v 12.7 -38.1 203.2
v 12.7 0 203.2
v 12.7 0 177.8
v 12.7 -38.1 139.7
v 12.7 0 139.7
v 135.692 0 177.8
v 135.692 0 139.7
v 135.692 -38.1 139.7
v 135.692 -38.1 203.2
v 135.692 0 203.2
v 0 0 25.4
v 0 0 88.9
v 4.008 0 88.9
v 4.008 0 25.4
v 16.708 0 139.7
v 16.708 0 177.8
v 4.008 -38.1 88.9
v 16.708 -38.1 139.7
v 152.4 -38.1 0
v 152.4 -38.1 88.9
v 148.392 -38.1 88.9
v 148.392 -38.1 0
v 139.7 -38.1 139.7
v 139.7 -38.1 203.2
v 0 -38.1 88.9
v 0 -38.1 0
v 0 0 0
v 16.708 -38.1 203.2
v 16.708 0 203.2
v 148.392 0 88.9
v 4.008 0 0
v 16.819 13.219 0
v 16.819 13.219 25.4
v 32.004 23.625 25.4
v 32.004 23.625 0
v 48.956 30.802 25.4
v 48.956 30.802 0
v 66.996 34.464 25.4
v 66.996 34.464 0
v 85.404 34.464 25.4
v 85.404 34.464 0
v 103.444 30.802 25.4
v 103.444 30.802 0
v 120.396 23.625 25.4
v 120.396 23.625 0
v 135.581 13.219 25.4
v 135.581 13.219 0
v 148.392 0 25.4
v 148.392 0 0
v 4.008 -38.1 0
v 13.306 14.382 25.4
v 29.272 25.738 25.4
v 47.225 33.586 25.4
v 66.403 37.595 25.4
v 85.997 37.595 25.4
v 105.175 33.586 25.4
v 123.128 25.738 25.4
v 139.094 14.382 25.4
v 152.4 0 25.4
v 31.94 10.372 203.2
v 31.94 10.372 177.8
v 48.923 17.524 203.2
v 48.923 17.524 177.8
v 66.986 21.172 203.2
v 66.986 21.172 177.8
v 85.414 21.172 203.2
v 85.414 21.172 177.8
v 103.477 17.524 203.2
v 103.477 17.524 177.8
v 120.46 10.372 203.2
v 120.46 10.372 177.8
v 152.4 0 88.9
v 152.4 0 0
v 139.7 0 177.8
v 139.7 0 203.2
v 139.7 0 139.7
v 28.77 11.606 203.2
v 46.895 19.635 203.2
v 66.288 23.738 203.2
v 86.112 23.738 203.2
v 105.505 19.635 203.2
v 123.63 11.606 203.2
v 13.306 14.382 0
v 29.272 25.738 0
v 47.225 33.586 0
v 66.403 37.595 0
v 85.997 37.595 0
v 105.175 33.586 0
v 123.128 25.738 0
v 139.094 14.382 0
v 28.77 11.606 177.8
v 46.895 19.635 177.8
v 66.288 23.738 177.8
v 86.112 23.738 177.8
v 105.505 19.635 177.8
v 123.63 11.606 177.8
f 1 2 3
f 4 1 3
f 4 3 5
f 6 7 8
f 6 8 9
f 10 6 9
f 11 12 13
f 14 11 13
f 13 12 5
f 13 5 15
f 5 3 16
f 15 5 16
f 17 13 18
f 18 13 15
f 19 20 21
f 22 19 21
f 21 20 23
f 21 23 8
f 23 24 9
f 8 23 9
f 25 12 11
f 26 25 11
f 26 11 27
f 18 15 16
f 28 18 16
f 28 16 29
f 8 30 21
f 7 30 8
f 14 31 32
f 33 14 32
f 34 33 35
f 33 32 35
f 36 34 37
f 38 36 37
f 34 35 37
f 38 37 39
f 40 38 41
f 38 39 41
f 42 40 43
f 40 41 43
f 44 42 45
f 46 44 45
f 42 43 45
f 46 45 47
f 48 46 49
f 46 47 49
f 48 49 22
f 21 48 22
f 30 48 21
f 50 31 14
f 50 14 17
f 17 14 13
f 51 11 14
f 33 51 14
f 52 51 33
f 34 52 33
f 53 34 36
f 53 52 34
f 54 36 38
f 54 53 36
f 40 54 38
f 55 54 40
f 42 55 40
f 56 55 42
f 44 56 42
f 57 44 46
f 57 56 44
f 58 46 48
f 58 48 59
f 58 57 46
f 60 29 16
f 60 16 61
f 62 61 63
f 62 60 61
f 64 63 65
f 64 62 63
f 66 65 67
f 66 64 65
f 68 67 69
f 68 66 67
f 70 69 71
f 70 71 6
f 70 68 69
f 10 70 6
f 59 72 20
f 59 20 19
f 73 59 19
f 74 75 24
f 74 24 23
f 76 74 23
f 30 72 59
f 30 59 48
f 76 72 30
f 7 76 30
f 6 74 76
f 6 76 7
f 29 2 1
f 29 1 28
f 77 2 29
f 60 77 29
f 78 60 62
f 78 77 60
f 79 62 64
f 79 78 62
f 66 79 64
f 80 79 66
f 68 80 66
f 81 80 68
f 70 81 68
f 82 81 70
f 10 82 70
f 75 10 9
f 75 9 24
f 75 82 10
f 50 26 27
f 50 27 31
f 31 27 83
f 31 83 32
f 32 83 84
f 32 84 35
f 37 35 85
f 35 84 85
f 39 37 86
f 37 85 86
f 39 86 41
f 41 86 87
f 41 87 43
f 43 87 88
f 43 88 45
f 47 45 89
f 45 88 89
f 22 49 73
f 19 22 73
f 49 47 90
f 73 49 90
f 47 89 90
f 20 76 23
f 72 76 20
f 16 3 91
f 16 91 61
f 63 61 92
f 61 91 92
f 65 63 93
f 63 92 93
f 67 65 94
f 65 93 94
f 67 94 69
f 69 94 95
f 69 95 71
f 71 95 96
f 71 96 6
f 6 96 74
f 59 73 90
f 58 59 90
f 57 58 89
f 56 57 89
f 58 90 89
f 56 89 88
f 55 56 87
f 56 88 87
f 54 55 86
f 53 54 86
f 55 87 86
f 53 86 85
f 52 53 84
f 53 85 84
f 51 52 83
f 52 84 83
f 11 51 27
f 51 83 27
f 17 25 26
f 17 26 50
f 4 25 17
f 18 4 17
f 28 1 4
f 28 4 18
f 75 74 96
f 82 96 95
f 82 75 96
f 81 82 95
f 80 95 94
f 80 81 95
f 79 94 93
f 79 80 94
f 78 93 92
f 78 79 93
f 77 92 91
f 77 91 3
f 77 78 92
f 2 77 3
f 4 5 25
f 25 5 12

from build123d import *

# Parameters (mm, degrees)
F1_DEPTH = 25.4
F2_DEPTH = 38.1
F4_DEPTH = 38.1
F7_DEPTH = 25.4


# Not quite as in the source:
# - a pattern or mirror of a feature is missing from the dataset's text; its kind, count and spacing are read off the source's solid


with BuildPart() as f1:
    # F0 (on Top) → F1 (new body)
    with BuildSketch(Plane.XY):
        with BuildLine():
            Line((148.3919879557, 0), (152.4, 0))
            ThreePointArc((152.4, 0), (76.2, 38.1), (0, 0))
            Line((0, 0), (4.0080120443, 0))
            ThreePointArc((4.0080120443, 0), (76.2, 34.925), (148.3919879557, 0))
        make_face()
    extrude(amount=F1_DEPTH)

    # F2 (add): faces of the model
    f2_faces = [f1.faces().sort_by_distance(p)[0] for p in [
        (150.3959939779, 0, 12.7),
        (2.0040060221, 0, 12.7),
    ]]
    extrude(f2_faces, amount=F2_DEPTH)

    # F3 (on Front) → F4 (join)
    with BuildSketch(Plane.XZ):
        Polygon((0, 25.4), (4.0080120443, 25.4), (4.0080120443, 88.9), (16.7080120443, 139.7), (16.7080120443, 203.2), (12.7, 203.2), (12.7, 139.7), (0, 88.9), align=None)
    f4 = extrude(amount=F4_DEPTH)

    # F4_copies: F4 across plane
    add(f4.mirror(Plane(origin=(76.2, 0, 0), x_dir=(0, 0, 1), z_dir=(1, 0, 0))))

    # F6 (on face) → F7 (join)
    with BuildSketch(Plane.XY.offset(203.2)):
        with BuildLine():
            ThreePointArc((16.7080120443, 0), (76.2, 21.631021226), (135.6919879557, 0))
            Line((135.6919879557, 0), (139.7, 0))
            ThreePointArc((139.7, 0), (76.2, 24.2548417144), (12.7, 0))
            Line((12.7, 0), (16.7080120443, 0))
        make_face()
    extrude(amount=-F7_DEPTH)


solid = f1.part
